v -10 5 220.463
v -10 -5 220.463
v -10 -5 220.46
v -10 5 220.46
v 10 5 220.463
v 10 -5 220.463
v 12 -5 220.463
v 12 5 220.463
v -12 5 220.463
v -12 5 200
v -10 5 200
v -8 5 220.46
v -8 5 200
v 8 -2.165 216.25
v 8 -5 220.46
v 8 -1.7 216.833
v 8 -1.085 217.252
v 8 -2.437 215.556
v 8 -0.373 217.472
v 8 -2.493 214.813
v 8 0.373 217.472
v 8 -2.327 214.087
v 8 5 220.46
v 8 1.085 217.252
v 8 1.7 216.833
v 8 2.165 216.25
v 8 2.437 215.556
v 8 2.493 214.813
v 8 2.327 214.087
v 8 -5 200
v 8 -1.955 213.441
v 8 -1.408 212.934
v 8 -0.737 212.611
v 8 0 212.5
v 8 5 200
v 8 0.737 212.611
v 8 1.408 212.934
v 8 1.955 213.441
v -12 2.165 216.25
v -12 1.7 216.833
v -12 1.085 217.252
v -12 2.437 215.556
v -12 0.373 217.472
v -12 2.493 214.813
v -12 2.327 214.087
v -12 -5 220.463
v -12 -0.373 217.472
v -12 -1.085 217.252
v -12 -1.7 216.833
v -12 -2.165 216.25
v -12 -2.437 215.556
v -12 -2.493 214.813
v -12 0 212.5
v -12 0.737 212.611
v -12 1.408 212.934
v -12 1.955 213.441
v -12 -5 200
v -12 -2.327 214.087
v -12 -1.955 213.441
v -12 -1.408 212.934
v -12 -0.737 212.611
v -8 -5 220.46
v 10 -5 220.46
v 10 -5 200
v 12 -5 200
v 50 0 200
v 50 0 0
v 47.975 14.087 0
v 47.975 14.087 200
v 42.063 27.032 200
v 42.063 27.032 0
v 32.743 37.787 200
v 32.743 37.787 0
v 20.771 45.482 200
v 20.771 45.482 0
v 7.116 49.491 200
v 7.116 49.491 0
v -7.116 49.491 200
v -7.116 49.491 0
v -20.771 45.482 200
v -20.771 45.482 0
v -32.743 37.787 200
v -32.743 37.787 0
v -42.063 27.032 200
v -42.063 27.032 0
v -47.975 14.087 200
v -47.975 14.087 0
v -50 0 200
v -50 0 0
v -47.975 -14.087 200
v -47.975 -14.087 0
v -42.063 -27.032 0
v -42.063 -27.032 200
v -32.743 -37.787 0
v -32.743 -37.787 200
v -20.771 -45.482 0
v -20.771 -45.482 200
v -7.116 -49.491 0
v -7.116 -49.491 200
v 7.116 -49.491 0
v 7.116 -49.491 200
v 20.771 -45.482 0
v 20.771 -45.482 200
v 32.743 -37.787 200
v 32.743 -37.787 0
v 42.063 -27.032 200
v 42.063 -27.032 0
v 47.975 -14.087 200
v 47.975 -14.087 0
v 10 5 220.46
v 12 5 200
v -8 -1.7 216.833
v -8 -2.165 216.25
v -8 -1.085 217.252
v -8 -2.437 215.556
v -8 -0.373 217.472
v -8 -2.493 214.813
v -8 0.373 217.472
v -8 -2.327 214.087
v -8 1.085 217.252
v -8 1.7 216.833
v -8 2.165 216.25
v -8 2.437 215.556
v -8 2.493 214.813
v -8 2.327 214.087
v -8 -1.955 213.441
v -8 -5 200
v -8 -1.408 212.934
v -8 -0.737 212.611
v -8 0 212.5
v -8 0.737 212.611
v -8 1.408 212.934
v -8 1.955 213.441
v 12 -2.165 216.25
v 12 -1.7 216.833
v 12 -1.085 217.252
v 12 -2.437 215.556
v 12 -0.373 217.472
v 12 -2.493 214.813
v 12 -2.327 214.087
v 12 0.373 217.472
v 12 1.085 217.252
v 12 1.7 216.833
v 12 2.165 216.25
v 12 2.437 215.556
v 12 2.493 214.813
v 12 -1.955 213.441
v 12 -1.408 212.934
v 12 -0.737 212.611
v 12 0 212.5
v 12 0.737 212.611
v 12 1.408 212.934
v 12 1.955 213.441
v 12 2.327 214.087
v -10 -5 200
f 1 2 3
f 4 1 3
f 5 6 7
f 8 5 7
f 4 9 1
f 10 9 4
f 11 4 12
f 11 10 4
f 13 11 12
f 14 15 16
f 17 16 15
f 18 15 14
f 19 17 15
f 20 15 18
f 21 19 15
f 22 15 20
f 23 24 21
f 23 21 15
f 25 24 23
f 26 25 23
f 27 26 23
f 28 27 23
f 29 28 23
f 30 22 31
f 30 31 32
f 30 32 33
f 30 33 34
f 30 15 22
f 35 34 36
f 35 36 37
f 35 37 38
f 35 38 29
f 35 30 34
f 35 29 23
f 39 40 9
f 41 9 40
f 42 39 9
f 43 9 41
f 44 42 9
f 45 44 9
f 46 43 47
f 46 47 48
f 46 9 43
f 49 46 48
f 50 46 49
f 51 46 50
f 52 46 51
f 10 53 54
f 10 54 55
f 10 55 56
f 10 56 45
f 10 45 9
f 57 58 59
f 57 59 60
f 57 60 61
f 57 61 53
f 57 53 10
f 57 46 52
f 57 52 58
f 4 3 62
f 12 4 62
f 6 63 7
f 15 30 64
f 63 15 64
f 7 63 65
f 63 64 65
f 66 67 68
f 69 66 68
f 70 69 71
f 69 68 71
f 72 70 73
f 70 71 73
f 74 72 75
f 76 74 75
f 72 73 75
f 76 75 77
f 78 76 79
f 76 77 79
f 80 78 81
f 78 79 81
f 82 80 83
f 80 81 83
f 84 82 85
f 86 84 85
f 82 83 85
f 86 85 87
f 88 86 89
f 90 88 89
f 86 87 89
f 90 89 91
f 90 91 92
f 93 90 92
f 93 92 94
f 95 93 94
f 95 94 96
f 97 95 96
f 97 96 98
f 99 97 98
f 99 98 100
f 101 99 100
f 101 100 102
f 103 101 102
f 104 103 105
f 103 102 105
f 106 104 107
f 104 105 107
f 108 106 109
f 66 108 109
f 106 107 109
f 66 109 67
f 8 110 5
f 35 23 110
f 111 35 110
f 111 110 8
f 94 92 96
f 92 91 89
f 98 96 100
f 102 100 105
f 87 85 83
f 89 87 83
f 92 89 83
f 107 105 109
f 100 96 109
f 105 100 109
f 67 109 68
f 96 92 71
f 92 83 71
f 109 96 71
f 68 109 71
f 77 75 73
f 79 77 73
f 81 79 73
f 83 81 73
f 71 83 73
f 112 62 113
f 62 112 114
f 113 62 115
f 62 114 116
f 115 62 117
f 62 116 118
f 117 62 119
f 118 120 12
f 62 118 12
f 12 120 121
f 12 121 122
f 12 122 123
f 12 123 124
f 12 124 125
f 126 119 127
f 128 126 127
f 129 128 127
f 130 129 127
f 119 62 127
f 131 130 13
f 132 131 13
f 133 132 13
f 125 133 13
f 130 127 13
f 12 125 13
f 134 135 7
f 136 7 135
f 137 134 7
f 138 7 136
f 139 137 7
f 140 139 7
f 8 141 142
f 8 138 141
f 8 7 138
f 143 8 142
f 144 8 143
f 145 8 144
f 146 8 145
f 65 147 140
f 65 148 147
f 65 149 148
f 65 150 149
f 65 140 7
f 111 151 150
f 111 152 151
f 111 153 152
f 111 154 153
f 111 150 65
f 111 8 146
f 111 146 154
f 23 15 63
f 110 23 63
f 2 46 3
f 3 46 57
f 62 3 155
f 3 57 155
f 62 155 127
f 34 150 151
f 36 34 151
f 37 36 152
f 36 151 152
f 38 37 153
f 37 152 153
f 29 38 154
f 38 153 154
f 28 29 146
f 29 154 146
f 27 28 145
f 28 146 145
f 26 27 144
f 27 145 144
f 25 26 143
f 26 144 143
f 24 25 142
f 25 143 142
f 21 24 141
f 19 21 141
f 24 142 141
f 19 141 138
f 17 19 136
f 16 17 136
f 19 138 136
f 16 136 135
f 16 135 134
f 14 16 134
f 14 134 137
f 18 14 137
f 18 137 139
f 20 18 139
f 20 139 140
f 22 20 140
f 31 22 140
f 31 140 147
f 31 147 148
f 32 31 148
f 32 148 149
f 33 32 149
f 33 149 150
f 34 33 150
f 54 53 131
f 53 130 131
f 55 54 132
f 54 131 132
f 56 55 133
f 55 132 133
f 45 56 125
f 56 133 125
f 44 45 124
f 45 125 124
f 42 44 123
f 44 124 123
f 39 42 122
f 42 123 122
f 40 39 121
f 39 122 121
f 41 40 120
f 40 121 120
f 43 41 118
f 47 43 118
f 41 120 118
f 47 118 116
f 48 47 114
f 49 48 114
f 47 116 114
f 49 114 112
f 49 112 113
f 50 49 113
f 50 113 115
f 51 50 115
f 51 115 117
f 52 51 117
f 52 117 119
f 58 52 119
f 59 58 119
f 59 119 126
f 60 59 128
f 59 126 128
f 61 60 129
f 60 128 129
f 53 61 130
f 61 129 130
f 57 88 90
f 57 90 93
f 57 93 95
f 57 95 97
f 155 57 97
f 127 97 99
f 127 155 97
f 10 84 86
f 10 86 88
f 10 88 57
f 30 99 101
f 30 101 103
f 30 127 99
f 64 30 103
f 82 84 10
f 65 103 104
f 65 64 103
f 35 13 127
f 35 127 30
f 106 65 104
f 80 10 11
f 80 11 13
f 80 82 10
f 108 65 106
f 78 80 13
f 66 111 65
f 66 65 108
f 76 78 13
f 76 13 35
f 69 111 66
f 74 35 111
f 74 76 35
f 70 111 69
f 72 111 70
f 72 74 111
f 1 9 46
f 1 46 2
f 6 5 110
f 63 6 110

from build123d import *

# Parameters (mm, degrees)
SKETCH1_R           = 50
BOSS_EXTRUDE1_DEPTH = 200
SKETCH2_W           = 2
SKETCH2_H           = 20.463168159
BOSS_EXTRUDE2_DEPTH = 5
SKETCH3_R           = 2.5
CUT_EXTRUDE1_DEPTH  = 17
BOSS_EXTRUDE3_START = 200
SKETCH4_W           = 2
SKETCH4_H           = 10
BOSS_EXTRUDE3_DEPTH = 20.46
SKETCH5_R           = 2.5
CUT_EXTRUDE2_DEPTH  = 12.5


with BuildPart() as part:
    # Sketch1 → Boss-Extrude1 (new body)
    with BuildSketch(Plane.XY):
        Circle(SKETCH1_R)
    extrude(amount=BOSS_EXTRUDE1_DEPTH)

    # Sketch2 → Boss-Extrude2 (add, symmetric)
    with BuildSketch(Plane(origin=(0, 0, 0), x_dir=(1, 0, 0), z_dir=(0, 1, 0))):
        with Locations((-11, -210.23158408)):
            Rectangle(SKETCH2_W, SKETCH2_H)
        with Locations((11, -210.23158408)):
            Rectangle(SKETCH2_W, SKETCH2_H)
    extrude(amount=BOSS_EXTRUDE2_DEPTH, both=True)

    # Sketch3 → Cut-Extrude1 (cut, symmetric)
    with BuildSketch(Plane(origin=(0, 0, 0), x_dir=(0, 0, -1), z_dir=(1, 0, 0))):
        with Locations((-215, 0)):
            Circle(SKETCH3_R)
    extrude(amount=CUT_EXTRUDE1_DEPTH, both=True, mode=Mode.SUBTRACT)

    # Sketch4 → Boss-Extrude3 (add)
    with BuildSketch(Plane.XY.offset(BOSS_EXTRUDE3_START)):
        with Locations((-9, 0)):
            Rectangle(SKETCH4_W, SKETCH4_H)
        with Locations((9, 0)):
            Rectangle(SKETCH4_W, SKETCH4_H)
    extrude(amount=BOSS_EXTRUDE3_DEPTH)

    # Sketch5 → Cut-Extrude2 (cut, symmetric)
    with BuildSketch(Plane(origin=(0, 0, 0), x_dir=(0, 0, -1), z_dir=(1, 0, 0))):
        with Locations((-215, 0)):
            Circle(SKETCH5_R)
    extrude(amount=CUT_EXTRUDE2_DEPTH, both=True, mode=Mode.SUBTRACT)


solid = part.part
